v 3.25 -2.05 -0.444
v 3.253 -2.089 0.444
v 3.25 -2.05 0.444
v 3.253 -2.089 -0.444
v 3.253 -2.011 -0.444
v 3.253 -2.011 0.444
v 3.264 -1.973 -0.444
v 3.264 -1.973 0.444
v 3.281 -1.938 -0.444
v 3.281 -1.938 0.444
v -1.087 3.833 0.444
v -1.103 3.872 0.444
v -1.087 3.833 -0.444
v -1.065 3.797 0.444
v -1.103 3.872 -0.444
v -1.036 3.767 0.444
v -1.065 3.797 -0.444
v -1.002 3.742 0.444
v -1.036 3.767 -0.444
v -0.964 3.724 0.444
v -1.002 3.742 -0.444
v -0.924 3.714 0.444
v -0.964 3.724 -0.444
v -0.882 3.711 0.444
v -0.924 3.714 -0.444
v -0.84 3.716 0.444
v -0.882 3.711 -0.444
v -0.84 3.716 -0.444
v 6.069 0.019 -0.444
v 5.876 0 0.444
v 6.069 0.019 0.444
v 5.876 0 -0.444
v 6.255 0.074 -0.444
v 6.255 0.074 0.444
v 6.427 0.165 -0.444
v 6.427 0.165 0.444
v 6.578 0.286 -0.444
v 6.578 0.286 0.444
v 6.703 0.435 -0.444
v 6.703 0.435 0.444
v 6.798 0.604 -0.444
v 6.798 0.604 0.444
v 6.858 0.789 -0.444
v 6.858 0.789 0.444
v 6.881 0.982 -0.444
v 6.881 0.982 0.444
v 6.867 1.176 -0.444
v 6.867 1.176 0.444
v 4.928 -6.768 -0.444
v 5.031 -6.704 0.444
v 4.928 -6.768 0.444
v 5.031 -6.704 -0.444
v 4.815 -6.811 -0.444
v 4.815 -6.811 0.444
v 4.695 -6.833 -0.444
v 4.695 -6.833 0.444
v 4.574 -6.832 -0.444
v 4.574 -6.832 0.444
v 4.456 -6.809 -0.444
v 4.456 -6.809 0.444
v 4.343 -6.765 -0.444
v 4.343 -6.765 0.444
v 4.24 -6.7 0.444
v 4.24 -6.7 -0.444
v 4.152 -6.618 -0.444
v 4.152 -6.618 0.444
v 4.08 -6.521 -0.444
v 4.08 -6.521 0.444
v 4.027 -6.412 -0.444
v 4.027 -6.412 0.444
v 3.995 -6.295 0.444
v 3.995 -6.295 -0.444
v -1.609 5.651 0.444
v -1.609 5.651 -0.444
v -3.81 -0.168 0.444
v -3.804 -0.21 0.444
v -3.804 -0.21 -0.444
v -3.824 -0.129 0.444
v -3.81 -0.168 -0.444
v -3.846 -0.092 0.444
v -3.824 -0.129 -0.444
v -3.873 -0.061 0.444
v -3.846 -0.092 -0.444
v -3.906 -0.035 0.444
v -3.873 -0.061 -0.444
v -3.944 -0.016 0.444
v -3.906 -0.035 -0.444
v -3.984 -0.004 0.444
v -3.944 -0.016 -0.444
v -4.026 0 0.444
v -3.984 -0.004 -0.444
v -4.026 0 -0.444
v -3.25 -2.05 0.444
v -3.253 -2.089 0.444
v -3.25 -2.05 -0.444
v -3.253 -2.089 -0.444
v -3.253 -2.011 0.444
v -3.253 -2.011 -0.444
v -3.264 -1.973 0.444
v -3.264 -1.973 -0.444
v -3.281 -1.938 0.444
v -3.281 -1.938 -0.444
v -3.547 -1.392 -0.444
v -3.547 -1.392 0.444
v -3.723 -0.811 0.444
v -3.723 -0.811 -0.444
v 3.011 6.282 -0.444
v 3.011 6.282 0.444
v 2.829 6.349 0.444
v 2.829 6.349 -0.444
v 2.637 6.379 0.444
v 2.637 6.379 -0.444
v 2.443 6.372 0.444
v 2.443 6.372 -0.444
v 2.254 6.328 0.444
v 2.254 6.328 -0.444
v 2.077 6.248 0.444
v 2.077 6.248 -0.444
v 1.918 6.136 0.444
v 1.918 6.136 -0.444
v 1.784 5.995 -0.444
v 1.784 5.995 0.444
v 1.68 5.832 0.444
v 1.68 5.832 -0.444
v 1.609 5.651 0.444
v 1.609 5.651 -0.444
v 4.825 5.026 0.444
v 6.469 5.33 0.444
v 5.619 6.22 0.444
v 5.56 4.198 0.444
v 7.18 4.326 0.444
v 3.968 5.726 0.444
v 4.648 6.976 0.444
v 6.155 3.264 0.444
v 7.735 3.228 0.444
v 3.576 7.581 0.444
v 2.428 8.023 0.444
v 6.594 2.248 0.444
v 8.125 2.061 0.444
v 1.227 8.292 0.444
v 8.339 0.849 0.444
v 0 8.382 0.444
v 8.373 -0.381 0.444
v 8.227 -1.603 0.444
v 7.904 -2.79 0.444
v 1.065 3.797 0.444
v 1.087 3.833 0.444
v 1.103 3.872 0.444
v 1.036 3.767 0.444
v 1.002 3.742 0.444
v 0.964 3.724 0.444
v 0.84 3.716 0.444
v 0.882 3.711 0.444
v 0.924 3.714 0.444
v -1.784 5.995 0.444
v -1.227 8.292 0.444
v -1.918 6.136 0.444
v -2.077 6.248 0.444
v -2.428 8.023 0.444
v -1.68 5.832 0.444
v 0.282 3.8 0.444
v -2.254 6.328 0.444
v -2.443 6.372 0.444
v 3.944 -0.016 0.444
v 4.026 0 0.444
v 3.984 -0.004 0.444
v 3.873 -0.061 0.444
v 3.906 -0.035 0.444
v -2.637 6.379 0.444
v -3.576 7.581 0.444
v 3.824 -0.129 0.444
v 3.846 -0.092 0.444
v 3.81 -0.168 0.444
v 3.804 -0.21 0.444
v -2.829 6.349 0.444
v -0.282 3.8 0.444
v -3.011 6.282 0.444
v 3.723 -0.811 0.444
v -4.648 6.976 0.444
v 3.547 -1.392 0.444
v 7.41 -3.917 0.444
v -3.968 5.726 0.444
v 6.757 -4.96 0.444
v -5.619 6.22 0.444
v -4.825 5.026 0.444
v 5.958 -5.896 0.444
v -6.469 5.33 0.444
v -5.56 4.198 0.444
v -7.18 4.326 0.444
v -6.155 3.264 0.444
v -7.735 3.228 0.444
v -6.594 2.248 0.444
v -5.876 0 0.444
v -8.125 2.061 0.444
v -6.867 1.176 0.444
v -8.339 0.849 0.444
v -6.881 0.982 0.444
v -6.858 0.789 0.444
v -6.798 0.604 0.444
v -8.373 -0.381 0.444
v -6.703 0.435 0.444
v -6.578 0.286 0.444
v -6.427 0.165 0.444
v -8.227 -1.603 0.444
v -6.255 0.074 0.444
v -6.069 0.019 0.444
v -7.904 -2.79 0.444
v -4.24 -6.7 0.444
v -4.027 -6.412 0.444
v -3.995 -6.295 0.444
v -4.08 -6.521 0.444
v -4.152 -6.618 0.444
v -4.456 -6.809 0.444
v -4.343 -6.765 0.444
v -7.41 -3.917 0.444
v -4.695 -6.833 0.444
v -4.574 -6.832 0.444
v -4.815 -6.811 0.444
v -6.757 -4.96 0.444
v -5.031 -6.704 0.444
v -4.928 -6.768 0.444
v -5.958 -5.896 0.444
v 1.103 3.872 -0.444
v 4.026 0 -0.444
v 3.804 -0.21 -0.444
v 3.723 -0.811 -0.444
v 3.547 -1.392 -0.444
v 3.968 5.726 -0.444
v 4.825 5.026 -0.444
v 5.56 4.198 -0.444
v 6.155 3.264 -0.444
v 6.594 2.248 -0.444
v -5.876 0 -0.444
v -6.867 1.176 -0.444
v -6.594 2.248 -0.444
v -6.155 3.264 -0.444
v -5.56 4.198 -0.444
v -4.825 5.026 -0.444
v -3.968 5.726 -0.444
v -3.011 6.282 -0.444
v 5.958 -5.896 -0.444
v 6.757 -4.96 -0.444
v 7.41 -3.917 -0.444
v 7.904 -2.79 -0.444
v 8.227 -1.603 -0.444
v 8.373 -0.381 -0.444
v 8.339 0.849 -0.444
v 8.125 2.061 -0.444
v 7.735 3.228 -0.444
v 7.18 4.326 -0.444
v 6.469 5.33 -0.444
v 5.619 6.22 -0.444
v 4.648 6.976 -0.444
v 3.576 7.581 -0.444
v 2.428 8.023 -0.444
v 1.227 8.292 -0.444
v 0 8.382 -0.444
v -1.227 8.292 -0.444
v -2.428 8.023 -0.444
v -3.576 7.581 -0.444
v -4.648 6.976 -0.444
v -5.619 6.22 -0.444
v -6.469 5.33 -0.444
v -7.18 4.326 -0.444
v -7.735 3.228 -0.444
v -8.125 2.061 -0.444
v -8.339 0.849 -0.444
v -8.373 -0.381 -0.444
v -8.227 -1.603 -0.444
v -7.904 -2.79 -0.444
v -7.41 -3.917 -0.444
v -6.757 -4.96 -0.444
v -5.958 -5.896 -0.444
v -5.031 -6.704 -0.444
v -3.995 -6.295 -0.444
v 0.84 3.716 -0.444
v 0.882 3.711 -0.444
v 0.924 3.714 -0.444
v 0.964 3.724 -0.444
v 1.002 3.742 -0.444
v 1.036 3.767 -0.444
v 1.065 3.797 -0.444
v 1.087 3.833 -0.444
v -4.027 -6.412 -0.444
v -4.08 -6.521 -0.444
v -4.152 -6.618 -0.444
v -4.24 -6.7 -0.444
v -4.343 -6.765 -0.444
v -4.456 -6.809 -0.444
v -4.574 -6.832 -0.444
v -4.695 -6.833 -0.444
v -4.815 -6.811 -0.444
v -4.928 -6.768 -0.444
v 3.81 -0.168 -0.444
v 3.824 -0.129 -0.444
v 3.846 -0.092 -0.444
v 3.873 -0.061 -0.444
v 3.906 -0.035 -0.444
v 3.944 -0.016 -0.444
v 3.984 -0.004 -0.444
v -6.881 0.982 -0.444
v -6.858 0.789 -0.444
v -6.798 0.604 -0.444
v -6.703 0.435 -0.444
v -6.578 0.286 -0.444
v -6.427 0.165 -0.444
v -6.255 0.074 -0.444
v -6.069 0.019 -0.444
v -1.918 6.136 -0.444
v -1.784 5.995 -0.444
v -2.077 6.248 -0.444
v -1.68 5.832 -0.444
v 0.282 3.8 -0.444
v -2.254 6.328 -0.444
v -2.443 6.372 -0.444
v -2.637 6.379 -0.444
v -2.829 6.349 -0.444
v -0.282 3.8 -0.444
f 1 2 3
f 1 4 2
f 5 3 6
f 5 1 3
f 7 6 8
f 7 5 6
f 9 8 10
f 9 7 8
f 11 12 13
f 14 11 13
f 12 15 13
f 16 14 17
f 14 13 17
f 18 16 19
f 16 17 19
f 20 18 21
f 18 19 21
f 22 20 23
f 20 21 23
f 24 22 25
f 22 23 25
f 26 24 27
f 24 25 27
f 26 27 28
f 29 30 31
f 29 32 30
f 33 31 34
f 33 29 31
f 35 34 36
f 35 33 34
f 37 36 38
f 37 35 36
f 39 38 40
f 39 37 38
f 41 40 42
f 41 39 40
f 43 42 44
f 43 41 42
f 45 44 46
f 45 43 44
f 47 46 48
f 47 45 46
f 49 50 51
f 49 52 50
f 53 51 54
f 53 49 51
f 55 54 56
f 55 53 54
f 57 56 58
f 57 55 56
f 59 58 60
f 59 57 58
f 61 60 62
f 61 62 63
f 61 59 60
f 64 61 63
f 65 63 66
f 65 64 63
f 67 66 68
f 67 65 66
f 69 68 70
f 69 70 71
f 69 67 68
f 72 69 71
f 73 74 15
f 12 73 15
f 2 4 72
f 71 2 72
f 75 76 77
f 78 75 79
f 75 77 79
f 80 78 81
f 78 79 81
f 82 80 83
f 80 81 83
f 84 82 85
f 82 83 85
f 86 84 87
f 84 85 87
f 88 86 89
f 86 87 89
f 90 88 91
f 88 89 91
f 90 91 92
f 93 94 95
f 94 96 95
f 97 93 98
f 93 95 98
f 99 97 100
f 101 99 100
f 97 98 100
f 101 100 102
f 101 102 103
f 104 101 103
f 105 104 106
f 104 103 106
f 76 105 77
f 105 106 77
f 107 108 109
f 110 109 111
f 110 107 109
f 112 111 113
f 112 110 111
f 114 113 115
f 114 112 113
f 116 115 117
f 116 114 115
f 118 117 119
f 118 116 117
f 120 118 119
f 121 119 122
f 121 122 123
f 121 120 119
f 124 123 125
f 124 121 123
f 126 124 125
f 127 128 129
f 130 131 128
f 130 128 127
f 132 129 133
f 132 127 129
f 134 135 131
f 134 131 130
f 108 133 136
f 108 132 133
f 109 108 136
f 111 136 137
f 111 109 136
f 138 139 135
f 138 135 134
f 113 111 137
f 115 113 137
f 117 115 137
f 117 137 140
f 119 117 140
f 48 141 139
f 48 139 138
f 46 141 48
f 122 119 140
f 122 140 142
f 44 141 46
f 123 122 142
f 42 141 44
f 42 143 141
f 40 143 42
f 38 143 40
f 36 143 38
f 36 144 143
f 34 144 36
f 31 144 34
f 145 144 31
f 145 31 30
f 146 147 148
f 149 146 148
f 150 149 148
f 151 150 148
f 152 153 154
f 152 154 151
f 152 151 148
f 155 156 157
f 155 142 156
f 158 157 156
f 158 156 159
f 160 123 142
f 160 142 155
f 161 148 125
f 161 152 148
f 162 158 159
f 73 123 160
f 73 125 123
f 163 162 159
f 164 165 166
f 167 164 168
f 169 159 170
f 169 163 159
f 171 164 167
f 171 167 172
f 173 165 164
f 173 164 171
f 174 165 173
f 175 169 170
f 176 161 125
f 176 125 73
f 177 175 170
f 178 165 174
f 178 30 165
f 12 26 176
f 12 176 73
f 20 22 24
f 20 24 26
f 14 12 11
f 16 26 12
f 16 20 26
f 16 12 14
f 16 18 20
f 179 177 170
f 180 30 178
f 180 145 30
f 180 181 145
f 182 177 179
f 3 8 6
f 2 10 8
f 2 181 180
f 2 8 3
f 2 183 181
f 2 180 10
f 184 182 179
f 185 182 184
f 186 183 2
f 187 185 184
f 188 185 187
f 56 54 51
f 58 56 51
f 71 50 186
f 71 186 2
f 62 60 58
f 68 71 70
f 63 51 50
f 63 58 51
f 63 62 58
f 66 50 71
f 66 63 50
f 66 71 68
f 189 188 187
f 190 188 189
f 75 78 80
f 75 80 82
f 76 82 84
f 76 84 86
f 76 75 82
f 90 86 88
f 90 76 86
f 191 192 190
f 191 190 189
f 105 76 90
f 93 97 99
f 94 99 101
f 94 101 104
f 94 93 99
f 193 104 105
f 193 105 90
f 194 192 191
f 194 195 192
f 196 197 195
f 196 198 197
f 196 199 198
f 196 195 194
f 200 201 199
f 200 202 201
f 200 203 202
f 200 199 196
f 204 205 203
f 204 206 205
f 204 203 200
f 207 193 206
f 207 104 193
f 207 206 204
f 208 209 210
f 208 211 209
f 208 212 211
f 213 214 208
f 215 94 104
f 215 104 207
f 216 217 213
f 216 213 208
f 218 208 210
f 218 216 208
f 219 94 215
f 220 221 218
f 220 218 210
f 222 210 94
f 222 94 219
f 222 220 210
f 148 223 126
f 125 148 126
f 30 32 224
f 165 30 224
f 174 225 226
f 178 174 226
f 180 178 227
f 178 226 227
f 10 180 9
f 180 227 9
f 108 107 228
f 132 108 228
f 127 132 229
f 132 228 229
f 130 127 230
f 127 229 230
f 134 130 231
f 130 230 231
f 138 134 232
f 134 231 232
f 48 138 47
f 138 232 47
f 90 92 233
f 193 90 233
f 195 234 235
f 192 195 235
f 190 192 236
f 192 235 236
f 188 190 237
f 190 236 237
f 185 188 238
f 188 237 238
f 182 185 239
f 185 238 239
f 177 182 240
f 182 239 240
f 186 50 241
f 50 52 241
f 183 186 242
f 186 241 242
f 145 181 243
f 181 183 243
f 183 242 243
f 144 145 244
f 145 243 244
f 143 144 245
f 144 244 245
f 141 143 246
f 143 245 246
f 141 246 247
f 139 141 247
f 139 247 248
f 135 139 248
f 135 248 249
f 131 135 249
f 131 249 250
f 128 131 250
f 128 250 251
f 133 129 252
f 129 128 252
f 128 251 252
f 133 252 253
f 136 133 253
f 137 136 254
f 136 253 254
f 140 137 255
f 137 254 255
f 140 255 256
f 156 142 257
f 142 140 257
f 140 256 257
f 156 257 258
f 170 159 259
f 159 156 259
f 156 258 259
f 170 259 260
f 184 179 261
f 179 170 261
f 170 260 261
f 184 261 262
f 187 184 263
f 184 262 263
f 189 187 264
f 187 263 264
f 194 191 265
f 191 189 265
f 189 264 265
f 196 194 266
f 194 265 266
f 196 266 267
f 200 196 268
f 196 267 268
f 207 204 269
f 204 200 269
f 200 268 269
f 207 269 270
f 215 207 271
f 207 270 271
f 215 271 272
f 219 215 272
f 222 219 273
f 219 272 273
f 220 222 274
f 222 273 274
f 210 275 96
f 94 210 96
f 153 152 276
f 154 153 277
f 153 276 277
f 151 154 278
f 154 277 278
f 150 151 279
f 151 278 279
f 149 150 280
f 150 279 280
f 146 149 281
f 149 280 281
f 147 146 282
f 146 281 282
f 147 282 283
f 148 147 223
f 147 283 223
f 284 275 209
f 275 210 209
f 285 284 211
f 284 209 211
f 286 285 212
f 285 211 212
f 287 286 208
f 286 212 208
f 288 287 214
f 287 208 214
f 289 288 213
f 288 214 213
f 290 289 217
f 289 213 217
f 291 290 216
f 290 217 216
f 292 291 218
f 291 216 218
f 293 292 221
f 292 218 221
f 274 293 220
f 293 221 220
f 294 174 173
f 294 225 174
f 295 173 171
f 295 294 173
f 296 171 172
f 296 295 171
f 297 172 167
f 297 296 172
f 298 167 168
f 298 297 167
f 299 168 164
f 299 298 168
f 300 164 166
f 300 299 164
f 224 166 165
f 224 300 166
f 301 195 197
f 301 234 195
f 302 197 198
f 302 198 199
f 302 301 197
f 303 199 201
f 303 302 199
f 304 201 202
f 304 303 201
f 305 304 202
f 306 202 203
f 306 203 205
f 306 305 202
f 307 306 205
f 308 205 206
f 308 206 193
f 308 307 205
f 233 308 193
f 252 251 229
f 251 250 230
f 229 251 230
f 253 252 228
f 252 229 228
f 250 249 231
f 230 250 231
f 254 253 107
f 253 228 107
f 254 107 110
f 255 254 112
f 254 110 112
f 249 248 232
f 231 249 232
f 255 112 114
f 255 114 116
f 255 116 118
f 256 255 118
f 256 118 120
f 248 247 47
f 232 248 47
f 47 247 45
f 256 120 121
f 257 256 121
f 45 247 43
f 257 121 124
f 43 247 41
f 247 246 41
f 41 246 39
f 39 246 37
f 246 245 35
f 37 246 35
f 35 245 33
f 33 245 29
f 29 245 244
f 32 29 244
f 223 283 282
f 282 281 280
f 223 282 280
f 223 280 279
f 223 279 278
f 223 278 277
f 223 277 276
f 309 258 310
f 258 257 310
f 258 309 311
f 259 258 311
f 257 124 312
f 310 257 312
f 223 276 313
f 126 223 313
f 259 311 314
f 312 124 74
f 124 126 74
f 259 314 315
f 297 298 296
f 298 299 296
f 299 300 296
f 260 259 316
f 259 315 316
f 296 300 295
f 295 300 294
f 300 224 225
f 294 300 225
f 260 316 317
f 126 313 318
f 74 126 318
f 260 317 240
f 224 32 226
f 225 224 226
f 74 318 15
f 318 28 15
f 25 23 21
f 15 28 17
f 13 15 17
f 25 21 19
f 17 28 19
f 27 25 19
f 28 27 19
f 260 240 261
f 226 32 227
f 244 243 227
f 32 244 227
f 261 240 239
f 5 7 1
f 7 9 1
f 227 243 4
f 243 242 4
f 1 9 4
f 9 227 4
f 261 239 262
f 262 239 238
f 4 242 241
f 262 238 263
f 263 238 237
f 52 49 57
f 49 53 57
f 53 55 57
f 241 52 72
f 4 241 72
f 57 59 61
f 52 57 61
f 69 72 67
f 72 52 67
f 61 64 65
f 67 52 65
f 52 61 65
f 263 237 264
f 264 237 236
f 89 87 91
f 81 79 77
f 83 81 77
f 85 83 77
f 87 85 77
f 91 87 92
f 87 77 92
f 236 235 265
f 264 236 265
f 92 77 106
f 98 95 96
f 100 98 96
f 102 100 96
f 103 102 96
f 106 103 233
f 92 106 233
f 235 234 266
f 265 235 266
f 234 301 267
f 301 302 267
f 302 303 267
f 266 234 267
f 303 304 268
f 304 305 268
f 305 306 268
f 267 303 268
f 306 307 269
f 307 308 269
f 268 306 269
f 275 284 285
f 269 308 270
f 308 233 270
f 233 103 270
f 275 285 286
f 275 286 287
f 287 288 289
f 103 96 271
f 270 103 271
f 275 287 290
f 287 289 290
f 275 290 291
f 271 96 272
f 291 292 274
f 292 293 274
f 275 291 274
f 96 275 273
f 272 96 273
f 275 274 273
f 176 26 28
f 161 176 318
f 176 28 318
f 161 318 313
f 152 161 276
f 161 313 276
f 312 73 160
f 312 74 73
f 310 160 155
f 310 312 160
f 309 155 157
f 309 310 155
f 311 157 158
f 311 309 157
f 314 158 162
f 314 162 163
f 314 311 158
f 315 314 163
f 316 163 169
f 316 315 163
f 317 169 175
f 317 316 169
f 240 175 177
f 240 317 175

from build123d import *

# Parameters (mm, degrees)
SKETCH3_W               = 8.382
SKETCH3_H               = 0.889
CUT_EXTRUDE1_DEPTH      = 1.4445
CUT_EXTRUDE1_DEPTH_BACK = 1.4445
FILLET1_R               = 1.00584
FILLET2_R               = 0.653796
FILLET3_R               = 0.22225


with BuildPart() as part:
    # Sketch3 → Revolve1 (revolve)
    with BuildSketch(Plane(origin=(0, 0, 0), x_dir=(1, 0, 0), z_dir=(0, 1, 0))):
        with Locations((-4.191, 0)):
            Rectangle(SKETCH3_W, SKETCH3_H)
    revolve(axis=Axis((0, 0, -0.4445), (0, 0, 1)))

    # Sketch4 → Cut-Extrude1 (cut, two sides)
    with BuildSketch(Plane.XY) as cut_extrude1_sk:
        with BuildLine():
            Line((1.043411472, 3.664340664), (1.907952406, 6.700508642))
            ThreePointArc((1.907952406, 6.700508642), (5.560104779, 4.197896295), (6.966857143, 0))
            Line((6.966857143, 0), (3.81, 0))
            ThreePointArc((3.81, 0), (3.664340664, -1.043411472), (3.2385, -2.00704204))
            Line((3.2385, -2.00704204), (4.167000213, -7.27282842))
            ThreePointArc((4.167000213, -7.27282842), (0, -8.382), (-4.167000213, -7.27282842))
            Line((-4.167000213, -7.27282842), (-3.2385, -2.00704204))
            ThreePointArc((-3.2385, -2.00704204), (-3.664340664, -1.043411472), (-3.81, 0))
            Line((-3.81, 0), (-6.966857143, 0))
            ThreePointArc((-6.966857143, 0), (-5.560104779, 4.197896295), (-1.907952406, 6.700508642))
            Line((-1.907952406, 6.700508642), (-1.043411472, 3.664340664))
            ThreePointArc((-1.043411472, 3.664340664), (0, 3.81), (1.043411472, 3.664340664))
        make_face()
    extrude(amount=CUT_EXTRUDE1_DEPTH, mode=Mode.SUBTRACT)
    extrude(cut_extrude1_sk.sketch, amount=-CUT_EXTRUDE1_DEPTH_BACK, mode=Mode.SUBTRACT)

    # Fillet1
    fillet1_edges = [part.edges().sort_by_distance(p)[0] for p in [
        (1.907952406, 6.700508642, 0),
        (6.966857143, 0, 0),
        (-6.966857143, 0, 0),
        (-1.907952406, 6.700508642, 0),
    ]]
    fillet(fillet1_edges, radius=FILLET1_R)

    # Fillet2
    fillet2_edges = [part.edges().sort_by_distance(p)[0] for p in [
        (4.167000213, -7.27282842, 0),
        (-4.167000213, -7.27282842, 0),
    ]]
    fillet(fillet2_edges, radius=FILLET2_R)

    # Fillet3
    fillet3_edges = [part.edges().sort_by_distance(p)[0] for p in [
        (-1.043411472, 3.664340664, 0),
        (1.043411472, 3.664340664, 0),
        (3.81, 0, 0),
        (3.2385, -2.00704204, 0),
        (-3.2385, -2.00704204, 0),
        (-3.81, 0, 0),
    ]]
    fillet(fillet3_edges, radius=FILLET3_R)


solid = part.part
